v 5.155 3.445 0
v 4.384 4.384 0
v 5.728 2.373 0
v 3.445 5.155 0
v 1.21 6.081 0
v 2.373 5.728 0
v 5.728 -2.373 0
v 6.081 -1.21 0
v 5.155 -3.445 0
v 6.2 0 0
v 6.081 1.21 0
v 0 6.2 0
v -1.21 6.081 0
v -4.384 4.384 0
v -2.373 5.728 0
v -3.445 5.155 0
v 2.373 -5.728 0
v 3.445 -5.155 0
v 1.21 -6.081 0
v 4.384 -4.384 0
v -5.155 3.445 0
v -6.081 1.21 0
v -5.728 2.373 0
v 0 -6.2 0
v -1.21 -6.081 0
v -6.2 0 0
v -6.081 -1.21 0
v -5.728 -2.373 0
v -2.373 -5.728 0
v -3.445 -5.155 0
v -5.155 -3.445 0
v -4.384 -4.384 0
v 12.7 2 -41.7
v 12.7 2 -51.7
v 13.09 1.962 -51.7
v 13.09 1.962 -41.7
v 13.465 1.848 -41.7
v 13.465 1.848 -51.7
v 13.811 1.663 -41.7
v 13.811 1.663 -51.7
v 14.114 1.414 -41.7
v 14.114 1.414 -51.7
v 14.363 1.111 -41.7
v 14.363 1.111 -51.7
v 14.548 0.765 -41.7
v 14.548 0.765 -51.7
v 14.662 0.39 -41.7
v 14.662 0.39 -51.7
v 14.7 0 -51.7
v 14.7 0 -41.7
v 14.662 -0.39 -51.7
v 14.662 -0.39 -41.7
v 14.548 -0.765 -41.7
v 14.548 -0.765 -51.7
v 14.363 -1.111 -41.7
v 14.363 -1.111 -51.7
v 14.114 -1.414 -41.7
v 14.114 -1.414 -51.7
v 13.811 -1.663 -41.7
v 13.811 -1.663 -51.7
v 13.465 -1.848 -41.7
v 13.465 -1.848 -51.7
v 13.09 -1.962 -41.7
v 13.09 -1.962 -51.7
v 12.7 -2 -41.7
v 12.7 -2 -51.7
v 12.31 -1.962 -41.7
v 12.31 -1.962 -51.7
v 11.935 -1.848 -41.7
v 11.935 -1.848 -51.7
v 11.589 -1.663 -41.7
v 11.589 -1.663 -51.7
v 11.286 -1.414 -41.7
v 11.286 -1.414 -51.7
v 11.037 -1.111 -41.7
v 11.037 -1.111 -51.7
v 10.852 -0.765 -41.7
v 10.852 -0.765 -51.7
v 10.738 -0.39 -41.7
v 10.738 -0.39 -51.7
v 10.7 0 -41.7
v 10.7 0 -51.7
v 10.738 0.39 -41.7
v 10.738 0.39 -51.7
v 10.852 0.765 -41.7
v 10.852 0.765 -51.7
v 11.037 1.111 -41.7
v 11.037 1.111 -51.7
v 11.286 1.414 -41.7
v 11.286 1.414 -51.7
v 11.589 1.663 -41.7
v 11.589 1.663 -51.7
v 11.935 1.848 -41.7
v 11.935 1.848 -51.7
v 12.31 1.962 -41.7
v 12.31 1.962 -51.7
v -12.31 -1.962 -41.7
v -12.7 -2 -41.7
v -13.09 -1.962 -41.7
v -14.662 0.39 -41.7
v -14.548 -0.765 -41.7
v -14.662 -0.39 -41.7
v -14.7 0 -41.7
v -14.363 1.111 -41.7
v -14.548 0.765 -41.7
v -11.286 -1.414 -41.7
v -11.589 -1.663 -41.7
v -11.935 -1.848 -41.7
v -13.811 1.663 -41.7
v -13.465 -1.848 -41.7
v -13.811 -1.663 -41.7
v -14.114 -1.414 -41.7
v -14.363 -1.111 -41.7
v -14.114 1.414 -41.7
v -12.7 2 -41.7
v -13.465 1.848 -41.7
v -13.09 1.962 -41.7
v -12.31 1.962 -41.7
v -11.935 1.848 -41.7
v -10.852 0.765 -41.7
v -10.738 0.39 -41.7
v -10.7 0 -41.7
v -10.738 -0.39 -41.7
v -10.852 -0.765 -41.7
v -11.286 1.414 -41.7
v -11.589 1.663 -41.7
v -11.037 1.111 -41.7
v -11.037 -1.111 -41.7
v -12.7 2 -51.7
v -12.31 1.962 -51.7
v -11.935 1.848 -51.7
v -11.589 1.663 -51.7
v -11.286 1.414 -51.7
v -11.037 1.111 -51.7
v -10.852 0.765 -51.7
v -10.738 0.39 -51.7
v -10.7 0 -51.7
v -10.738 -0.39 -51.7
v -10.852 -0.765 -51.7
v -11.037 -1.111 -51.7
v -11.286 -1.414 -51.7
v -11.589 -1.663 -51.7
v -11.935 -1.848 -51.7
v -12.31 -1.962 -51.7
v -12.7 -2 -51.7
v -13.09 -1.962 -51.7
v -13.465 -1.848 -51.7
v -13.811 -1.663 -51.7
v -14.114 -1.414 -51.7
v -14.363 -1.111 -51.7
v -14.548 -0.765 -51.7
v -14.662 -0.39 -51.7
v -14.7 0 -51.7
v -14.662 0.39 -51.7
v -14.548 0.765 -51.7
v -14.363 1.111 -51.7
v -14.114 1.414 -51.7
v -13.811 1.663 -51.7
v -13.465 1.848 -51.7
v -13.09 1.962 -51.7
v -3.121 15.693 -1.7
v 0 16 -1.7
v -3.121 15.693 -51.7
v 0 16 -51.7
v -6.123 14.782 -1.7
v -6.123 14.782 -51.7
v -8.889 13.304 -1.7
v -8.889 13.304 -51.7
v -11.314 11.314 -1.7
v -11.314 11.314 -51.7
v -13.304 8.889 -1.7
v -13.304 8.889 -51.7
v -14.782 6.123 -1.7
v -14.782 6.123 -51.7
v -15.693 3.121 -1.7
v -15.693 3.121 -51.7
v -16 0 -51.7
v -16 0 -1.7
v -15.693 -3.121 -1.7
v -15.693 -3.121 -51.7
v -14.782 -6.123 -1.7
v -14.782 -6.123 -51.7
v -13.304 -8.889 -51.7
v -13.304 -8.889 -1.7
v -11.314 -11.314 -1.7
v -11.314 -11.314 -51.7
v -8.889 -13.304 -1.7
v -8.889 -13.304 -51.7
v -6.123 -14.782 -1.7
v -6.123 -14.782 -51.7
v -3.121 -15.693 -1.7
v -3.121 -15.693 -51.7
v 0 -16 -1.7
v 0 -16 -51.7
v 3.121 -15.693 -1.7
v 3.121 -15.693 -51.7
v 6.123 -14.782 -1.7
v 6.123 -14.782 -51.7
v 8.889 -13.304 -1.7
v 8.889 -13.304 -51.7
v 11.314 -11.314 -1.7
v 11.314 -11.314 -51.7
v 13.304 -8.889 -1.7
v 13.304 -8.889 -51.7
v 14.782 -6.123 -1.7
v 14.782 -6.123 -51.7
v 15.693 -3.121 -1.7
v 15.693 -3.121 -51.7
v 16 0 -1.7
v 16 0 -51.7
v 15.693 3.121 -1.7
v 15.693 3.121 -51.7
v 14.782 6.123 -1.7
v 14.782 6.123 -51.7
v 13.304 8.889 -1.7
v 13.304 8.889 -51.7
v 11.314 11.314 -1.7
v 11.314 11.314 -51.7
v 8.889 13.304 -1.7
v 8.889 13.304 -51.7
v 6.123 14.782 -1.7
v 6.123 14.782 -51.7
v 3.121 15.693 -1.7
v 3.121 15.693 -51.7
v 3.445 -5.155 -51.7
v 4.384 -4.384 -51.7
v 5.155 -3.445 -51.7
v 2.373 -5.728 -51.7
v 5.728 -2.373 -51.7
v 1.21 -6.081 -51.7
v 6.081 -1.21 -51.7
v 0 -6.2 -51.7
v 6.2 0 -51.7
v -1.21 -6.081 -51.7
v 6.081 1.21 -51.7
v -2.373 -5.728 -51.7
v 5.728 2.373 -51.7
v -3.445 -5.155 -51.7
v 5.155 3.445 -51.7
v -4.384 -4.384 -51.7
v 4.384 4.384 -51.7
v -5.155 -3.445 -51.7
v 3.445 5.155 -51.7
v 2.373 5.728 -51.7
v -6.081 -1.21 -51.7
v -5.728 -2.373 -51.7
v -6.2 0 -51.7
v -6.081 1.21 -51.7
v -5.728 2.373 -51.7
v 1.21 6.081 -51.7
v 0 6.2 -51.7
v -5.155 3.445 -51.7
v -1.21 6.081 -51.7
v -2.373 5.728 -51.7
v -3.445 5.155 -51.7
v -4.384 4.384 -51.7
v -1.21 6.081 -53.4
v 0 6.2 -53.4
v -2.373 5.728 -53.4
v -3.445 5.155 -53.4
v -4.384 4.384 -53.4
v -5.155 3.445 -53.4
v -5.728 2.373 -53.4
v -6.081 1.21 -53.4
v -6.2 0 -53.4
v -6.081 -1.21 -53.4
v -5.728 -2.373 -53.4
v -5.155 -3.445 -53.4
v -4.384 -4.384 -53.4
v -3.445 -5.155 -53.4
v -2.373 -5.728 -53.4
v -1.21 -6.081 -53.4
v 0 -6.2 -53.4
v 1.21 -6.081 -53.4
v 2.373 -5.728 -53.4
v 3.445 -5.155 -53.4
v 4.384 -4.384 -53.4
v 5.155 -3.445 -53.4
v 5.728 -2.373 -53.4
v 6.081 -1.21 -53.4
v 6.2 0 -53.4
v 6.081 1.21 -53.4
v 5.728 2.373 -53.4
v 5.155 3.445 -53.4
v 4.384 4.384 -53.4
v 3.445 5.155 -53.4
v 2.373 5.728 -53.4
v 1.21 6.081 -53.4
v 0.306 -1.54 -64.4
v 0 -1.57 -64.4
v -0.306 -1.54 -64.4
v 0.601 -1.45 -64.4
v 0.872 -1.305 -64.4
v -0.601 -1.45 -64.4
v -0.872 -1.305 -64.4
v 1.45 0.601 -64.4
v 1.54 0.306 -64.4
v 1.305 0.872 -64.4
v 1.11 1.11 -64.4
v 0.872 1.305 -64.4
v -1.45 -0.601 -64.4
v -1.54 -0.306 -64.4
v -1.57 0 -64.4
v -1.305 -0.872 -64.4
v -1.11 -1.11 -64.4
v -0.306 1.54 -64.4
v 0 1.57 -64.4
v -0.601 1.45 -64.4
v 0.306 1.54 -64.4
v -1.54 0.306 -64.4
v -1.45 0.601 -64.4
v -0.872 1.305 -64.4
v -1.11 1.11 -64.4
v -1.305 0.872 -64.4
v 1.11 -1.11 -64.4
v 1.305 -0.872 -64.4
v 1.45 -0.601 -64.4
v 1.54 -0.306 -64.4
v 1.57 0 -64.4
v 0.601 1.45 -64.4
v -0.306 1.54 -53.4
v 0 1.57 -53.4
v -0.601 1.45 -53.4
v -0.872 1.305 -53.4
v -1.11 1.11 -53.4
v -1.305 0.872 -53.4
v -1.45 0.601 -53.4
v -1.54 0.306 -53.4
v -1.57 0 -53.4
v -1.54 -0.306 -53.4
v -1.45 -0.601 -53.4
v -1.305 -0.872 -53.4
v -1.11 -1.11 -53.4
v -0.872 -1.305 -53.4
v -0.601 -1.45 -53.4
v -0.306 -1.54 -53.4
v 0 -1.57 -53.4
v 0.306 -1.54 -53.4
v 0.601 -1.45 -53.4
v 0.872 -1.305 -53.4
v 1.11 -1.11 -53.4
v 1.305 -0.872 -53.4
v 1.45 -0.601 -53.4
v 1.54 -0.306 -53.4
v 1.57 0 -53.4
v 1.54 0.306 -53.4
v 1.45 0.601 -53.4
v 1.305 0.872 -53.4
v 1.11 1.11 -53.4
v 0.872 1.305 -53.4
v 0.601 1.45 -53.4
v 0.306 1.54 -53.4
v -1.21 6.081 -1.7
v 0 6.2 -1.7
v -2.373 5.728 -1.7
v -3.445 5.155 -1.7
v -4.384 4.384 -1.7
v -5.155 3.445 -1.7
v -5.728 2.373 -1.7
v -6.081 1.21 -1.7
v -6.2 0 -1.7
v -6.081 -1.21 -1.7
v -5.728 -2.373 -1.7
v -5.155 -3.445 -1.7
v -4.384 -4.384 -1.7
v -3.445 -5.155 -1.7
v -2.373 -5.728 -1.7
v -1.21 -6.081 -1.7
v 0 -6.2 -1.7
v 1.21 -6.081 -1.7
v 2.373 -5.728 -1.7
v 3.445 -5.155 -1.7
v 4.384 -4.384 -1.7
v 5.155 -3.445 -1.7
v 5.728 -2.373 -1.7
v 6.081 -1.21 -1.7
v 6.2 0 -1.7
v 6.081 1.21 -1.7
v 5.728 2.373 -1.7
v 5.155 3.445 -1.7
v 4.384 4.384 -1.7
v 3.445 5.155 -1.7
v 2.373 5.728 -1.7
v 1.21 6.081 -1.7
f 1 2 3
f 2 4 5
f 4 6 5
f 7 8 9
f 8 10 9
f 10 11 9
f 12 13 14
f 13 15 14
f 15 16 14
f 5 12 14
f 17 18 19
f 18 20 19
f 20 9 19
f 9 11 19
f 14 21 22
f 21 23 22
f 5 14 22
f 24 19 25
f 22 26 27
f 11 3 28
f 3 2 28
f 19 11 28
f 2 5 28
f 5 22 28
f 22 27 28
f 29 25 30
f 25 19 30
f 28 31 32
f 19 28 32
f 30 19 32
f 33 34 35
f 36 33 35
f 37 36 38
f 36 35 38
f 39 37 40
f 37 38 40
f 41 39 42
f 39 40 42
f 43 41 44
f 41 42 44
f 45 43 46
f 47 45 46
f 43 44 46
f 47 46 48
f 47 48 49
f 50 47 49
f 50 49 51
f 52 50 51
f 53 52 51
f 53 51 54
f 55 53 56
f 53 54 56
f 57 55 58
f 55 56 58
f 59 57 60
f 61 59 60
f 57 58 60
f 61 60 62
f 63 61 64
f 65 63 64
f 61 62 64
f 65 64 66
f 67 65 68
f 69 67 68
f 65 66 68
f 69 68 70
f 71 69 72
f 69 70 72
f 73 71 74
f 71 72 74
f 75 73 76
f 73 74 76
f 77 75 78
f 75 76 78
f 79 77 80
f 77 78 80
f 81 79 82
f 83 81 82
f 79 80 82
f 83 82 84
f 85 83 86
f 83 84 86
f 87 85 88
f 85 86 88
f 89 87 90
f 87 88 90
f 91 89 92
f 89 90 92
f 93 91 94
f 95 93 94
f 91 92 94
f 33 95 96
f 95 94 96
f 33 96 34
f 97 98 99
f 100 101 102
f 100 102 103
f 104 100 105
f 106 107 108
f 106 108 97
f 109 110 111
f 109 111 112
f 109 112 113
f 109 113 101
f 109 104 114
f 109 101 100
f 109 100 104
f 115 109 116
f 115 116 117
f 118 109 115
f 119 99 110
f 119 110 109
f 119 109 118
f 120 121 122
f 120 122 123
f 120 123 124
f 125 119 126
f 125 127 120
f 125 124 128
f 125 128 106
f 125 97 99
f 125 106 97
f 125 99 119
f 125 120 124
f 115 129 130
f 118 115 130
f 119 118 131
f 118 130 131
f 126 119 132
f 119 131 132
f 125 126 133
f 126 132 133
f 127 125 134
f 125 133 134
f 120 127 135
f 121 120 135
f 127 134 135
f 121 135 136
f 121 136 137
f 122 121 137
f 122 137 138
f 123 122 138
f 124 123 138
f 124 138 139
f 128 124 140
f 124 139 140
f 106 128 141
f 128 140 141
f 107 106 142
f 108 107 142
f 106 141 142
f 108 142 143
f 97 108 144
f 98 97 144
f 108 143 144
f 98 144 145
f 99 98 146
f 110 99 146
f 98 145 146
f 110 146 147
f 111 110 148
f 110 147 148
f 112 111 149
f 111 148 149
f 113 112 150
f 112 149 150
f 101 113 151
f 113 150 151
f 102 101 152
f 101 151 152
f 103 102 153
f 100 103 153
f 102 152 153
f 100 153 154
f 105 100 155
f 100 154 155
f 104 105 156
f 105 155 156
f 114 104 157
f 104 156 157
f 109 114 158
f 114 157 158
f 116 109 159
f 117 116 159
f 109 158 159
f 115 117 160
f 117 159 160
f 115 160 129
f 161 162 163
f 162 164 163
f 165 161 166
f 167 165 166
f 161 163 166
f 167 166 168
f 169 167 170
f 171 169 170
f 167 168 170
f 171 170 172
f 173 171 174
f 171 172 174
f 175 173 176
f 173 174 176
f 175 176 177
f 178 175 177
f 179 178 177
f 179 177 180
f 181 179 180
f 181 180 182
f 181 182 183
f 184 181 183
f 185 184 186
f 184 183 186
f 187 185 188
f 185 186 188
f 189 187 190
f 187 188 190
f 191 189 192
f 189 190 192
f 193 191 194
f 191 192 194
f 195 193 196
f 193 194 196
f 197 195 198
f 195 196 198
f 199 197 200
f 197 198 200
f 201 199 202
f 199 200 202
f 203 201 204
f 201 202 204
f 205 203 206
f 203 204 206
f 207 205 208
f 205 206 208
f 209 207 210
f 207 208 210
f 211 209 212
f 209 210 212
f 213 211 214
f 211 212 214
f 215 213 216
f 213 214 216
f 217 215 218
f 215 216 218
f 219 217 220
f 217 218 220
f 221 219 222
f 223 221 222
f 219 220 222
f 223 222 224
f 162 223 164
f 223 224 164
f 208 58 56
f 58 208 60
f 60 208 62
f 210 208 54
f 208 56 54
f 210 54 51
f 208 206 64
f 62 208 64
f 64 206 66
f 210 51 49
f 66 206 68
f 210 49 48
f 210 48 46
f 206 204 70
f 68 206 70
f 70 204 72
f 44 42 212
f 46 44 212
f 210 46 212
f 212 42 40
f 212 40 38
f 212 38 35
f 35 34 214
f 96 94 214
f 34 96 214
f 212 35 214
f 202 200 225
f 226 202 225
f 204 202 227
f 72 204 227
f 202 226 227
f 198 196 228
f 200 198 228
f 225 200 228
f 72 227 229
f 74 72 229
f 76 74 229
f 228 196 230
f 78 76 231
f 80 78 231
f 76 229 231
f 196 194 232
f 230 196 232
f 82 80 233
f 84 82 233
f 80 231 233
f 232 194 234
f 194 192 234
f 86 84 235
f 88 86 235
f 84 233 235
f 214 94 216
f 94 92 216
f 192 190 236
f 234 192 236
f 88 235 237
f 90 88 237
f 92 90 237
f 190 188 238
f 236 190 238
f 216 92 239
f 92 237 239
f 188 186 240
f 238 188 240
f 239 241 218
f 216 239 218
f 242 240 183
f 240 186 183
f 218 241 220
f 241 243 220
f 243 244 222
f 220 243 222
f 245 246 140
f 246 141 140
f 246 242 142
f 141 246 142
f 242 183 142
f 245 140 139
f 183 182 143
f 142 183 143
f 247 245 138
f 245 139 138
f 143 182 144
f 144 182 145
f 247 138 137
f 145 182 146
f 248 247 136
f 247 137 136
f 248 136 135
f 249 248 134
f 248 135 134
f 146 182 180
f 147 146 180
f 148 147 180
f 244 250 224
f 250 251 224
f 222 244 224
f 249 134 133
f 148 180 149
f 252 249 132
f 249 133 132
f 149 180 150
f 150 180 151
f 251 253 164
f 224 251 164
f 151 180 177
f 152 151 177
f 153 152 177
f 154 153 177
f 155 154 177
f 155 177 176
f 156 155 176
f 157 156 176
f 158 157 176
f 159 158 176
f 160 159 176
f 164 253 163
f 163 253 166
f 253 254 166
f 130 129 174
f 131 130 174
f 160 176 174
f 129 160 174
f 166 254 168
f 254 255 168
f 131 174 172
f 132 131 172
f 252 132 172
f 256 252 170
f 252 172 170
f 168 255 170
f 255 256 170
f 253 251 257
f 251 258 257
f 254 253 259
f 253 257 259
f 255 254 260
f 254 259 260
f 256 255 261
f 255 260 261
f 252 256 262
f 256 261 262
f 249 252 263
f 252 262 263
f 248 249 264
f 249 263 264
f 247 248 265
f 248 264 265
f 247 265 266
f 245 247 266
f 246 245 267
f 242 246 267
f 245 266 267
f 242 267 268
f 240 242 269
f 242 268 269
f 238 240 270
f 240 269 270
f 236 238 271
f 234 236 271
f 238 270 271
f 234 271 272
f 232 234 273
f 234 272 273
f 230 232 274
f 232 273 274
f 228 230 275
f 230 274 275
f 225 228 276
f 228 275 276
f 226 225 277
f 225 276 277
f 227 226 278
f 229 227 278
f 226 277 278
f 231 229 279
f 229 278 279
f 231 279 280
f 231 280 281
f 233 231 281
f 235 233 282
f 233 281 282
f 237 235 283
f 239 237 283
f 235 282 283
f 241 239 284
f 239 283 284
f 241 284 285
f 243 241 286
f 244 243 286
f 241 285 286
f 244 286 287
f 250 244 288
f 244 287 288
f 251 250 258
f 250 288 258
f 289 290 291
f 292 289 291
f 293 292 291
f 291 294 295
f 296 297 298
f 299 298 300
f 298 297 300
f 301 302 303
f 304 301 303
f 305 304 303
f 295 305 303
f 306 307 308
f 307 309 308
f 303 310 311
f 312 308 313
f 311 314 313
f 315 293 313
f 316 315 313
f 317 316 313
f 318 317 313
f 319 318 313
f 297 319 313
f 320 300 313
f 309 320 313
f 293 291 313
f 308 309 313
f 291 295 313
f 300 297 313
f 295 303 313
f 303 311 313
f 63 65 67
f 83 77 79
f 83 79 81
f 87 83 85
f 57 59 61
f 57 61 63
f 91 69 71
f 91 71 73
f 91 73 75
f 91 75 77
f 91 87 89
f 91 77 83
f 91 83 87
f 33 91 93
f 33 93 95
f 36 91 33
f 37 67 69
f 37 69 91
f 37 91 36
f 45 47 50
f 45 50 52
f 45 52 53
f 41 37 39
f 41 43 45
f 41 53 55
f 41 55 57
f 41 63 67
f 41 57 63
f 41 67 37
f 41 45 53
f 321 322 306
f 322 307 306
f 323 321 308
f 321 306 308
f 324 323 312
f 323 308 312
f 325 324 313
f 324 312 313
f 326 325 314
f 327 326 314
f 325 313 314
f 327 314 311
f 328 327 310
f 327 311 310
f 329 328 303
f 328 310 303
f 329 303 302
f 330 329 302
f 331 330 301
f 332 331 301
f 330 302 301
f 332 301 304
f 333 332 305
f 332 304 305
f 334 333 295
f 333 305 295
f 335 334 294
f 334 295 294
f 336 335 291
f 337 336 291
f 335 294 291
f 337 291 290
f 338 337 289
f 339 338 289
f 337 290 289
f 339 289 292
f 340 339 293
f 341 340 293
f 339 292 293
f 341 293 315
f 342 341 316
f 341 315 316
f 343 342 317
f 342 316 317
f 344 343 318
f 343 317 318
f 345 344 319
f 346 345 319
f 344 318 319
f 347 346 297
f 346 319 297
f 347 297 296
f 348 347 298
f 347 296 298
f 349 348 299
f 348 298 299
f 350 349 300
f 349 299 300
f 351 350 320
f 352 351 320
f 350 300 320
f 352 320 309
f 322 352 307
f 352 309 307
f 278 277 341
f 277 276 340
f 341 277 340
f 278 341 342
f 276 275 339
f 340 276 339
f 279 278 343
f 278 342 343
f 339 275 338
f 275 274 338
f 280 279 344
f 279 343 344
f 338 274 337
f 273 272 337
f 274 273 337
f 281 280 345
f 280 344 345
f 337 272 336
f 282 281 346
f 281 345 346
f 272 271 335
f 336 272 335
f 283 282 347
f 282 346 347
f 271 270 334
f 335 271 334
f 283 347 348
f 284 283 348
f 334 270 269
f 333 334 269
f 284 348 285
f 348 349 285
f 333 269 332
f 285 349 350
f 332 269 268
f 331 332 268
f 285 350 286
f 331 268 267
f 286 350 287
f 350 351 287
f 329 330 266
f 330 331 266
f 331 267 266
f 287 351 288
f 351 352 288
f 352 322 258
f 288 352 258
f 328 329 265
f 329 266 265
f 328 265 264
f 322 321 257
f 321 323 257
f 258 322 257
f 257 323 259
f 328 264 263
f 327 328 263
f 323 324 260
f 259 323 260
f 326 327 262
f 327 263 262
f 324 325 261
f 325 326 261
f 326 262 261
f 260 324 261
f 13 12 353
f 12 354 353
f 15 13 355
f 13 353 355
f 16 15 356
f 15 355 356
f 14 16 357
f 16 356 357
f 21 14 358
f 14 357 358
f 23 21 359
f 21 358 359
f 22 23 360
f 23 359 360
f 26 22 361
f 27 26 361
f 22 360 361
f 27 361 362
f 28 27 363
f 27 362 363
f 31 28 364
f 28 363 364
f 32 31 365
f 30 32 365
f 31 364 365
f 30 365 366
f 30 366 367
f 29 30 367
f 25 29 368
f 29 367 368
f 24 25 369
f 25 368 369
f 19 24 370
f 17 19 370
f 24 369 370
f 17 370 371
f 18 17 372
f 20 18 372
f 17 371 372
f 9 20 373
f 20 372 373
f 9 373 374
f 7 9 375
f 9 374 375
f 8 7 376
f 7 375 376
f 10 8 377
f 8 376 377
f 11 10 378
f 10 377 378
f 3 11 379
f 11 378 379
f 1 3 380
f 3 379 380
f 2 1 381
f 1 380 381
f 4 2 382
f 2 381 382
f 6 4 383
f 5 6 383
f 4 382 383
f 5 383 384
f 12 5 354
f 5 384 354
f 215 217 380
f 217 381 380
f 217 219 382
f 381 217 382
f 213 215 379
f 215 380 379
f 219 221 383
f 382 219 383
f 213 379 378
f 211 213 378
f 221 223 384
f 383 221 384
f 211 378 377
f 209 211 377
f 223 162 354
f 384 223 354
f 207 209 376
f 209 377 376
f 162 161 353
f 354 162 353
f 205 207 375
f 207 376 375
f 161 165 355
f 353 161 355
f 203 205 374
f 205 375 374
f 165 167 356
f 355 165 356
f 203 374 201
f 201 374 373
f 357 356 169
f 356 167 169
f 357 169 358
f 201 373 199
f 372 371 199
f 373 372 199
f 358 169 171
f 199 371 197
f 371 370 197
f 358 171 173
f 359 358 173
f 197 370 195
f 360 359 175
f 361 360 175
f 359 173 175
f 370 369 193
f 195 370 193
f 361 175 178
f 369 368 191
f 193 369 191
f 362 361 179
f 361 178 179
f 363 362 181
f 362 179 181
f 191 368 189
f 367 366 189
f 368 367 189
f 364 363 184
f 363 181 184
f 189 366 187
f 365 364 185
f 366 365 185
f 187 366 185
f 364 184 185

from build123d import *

# Parameters (mm, degrees)
SKETCH3_R      = 2
EXTRUDE1_DEPTH = 10


with BuildPart() as part:
    # Sketch2 → Revolve1 (revolve)
    with BuildSketch(Plane(origin=(0, 0, 0), x_dir=(0, 0, -1), z_dir=(1, 0, 0)), mode=Mode.PRIVATE) as revolve1_sk:
        Polygon((0, 0), (0, -6.2), (1.7, -6.2), (1.7, -16), (51.7, -16), (51.7, -6.2), (53.4, -6.2), (53.4, -1.57), (64.4, -1.57), (64.4, 0), align=None)
    revolve(revolve1_sk.sketch.rotate(Axis((0, 0, -64.4), (0, 0, 1)), 180), axis=Axis((0, 0, -64.4), (0, 0, 1)))

    # Sketch3 → Extrude1 (cut)
    with BuildSketch(Plane(origin=(0, 0, -51.7), x_dir=(-1, 0, 0), z_dir=(0, 0, -1))):
        with Locations(Location((12.7, 0, 0), (0, 0, 90))):
            Circle(SKETCH3_R)
        with Locations(Location((-12.7, 0, 0), (0, 0, 90))):
            Circle(SKETCH3_R)
    extrude(amount=-EXTRUDE1_DEPTH, mode=Mode.SUBTRACT)


solid = part.part
